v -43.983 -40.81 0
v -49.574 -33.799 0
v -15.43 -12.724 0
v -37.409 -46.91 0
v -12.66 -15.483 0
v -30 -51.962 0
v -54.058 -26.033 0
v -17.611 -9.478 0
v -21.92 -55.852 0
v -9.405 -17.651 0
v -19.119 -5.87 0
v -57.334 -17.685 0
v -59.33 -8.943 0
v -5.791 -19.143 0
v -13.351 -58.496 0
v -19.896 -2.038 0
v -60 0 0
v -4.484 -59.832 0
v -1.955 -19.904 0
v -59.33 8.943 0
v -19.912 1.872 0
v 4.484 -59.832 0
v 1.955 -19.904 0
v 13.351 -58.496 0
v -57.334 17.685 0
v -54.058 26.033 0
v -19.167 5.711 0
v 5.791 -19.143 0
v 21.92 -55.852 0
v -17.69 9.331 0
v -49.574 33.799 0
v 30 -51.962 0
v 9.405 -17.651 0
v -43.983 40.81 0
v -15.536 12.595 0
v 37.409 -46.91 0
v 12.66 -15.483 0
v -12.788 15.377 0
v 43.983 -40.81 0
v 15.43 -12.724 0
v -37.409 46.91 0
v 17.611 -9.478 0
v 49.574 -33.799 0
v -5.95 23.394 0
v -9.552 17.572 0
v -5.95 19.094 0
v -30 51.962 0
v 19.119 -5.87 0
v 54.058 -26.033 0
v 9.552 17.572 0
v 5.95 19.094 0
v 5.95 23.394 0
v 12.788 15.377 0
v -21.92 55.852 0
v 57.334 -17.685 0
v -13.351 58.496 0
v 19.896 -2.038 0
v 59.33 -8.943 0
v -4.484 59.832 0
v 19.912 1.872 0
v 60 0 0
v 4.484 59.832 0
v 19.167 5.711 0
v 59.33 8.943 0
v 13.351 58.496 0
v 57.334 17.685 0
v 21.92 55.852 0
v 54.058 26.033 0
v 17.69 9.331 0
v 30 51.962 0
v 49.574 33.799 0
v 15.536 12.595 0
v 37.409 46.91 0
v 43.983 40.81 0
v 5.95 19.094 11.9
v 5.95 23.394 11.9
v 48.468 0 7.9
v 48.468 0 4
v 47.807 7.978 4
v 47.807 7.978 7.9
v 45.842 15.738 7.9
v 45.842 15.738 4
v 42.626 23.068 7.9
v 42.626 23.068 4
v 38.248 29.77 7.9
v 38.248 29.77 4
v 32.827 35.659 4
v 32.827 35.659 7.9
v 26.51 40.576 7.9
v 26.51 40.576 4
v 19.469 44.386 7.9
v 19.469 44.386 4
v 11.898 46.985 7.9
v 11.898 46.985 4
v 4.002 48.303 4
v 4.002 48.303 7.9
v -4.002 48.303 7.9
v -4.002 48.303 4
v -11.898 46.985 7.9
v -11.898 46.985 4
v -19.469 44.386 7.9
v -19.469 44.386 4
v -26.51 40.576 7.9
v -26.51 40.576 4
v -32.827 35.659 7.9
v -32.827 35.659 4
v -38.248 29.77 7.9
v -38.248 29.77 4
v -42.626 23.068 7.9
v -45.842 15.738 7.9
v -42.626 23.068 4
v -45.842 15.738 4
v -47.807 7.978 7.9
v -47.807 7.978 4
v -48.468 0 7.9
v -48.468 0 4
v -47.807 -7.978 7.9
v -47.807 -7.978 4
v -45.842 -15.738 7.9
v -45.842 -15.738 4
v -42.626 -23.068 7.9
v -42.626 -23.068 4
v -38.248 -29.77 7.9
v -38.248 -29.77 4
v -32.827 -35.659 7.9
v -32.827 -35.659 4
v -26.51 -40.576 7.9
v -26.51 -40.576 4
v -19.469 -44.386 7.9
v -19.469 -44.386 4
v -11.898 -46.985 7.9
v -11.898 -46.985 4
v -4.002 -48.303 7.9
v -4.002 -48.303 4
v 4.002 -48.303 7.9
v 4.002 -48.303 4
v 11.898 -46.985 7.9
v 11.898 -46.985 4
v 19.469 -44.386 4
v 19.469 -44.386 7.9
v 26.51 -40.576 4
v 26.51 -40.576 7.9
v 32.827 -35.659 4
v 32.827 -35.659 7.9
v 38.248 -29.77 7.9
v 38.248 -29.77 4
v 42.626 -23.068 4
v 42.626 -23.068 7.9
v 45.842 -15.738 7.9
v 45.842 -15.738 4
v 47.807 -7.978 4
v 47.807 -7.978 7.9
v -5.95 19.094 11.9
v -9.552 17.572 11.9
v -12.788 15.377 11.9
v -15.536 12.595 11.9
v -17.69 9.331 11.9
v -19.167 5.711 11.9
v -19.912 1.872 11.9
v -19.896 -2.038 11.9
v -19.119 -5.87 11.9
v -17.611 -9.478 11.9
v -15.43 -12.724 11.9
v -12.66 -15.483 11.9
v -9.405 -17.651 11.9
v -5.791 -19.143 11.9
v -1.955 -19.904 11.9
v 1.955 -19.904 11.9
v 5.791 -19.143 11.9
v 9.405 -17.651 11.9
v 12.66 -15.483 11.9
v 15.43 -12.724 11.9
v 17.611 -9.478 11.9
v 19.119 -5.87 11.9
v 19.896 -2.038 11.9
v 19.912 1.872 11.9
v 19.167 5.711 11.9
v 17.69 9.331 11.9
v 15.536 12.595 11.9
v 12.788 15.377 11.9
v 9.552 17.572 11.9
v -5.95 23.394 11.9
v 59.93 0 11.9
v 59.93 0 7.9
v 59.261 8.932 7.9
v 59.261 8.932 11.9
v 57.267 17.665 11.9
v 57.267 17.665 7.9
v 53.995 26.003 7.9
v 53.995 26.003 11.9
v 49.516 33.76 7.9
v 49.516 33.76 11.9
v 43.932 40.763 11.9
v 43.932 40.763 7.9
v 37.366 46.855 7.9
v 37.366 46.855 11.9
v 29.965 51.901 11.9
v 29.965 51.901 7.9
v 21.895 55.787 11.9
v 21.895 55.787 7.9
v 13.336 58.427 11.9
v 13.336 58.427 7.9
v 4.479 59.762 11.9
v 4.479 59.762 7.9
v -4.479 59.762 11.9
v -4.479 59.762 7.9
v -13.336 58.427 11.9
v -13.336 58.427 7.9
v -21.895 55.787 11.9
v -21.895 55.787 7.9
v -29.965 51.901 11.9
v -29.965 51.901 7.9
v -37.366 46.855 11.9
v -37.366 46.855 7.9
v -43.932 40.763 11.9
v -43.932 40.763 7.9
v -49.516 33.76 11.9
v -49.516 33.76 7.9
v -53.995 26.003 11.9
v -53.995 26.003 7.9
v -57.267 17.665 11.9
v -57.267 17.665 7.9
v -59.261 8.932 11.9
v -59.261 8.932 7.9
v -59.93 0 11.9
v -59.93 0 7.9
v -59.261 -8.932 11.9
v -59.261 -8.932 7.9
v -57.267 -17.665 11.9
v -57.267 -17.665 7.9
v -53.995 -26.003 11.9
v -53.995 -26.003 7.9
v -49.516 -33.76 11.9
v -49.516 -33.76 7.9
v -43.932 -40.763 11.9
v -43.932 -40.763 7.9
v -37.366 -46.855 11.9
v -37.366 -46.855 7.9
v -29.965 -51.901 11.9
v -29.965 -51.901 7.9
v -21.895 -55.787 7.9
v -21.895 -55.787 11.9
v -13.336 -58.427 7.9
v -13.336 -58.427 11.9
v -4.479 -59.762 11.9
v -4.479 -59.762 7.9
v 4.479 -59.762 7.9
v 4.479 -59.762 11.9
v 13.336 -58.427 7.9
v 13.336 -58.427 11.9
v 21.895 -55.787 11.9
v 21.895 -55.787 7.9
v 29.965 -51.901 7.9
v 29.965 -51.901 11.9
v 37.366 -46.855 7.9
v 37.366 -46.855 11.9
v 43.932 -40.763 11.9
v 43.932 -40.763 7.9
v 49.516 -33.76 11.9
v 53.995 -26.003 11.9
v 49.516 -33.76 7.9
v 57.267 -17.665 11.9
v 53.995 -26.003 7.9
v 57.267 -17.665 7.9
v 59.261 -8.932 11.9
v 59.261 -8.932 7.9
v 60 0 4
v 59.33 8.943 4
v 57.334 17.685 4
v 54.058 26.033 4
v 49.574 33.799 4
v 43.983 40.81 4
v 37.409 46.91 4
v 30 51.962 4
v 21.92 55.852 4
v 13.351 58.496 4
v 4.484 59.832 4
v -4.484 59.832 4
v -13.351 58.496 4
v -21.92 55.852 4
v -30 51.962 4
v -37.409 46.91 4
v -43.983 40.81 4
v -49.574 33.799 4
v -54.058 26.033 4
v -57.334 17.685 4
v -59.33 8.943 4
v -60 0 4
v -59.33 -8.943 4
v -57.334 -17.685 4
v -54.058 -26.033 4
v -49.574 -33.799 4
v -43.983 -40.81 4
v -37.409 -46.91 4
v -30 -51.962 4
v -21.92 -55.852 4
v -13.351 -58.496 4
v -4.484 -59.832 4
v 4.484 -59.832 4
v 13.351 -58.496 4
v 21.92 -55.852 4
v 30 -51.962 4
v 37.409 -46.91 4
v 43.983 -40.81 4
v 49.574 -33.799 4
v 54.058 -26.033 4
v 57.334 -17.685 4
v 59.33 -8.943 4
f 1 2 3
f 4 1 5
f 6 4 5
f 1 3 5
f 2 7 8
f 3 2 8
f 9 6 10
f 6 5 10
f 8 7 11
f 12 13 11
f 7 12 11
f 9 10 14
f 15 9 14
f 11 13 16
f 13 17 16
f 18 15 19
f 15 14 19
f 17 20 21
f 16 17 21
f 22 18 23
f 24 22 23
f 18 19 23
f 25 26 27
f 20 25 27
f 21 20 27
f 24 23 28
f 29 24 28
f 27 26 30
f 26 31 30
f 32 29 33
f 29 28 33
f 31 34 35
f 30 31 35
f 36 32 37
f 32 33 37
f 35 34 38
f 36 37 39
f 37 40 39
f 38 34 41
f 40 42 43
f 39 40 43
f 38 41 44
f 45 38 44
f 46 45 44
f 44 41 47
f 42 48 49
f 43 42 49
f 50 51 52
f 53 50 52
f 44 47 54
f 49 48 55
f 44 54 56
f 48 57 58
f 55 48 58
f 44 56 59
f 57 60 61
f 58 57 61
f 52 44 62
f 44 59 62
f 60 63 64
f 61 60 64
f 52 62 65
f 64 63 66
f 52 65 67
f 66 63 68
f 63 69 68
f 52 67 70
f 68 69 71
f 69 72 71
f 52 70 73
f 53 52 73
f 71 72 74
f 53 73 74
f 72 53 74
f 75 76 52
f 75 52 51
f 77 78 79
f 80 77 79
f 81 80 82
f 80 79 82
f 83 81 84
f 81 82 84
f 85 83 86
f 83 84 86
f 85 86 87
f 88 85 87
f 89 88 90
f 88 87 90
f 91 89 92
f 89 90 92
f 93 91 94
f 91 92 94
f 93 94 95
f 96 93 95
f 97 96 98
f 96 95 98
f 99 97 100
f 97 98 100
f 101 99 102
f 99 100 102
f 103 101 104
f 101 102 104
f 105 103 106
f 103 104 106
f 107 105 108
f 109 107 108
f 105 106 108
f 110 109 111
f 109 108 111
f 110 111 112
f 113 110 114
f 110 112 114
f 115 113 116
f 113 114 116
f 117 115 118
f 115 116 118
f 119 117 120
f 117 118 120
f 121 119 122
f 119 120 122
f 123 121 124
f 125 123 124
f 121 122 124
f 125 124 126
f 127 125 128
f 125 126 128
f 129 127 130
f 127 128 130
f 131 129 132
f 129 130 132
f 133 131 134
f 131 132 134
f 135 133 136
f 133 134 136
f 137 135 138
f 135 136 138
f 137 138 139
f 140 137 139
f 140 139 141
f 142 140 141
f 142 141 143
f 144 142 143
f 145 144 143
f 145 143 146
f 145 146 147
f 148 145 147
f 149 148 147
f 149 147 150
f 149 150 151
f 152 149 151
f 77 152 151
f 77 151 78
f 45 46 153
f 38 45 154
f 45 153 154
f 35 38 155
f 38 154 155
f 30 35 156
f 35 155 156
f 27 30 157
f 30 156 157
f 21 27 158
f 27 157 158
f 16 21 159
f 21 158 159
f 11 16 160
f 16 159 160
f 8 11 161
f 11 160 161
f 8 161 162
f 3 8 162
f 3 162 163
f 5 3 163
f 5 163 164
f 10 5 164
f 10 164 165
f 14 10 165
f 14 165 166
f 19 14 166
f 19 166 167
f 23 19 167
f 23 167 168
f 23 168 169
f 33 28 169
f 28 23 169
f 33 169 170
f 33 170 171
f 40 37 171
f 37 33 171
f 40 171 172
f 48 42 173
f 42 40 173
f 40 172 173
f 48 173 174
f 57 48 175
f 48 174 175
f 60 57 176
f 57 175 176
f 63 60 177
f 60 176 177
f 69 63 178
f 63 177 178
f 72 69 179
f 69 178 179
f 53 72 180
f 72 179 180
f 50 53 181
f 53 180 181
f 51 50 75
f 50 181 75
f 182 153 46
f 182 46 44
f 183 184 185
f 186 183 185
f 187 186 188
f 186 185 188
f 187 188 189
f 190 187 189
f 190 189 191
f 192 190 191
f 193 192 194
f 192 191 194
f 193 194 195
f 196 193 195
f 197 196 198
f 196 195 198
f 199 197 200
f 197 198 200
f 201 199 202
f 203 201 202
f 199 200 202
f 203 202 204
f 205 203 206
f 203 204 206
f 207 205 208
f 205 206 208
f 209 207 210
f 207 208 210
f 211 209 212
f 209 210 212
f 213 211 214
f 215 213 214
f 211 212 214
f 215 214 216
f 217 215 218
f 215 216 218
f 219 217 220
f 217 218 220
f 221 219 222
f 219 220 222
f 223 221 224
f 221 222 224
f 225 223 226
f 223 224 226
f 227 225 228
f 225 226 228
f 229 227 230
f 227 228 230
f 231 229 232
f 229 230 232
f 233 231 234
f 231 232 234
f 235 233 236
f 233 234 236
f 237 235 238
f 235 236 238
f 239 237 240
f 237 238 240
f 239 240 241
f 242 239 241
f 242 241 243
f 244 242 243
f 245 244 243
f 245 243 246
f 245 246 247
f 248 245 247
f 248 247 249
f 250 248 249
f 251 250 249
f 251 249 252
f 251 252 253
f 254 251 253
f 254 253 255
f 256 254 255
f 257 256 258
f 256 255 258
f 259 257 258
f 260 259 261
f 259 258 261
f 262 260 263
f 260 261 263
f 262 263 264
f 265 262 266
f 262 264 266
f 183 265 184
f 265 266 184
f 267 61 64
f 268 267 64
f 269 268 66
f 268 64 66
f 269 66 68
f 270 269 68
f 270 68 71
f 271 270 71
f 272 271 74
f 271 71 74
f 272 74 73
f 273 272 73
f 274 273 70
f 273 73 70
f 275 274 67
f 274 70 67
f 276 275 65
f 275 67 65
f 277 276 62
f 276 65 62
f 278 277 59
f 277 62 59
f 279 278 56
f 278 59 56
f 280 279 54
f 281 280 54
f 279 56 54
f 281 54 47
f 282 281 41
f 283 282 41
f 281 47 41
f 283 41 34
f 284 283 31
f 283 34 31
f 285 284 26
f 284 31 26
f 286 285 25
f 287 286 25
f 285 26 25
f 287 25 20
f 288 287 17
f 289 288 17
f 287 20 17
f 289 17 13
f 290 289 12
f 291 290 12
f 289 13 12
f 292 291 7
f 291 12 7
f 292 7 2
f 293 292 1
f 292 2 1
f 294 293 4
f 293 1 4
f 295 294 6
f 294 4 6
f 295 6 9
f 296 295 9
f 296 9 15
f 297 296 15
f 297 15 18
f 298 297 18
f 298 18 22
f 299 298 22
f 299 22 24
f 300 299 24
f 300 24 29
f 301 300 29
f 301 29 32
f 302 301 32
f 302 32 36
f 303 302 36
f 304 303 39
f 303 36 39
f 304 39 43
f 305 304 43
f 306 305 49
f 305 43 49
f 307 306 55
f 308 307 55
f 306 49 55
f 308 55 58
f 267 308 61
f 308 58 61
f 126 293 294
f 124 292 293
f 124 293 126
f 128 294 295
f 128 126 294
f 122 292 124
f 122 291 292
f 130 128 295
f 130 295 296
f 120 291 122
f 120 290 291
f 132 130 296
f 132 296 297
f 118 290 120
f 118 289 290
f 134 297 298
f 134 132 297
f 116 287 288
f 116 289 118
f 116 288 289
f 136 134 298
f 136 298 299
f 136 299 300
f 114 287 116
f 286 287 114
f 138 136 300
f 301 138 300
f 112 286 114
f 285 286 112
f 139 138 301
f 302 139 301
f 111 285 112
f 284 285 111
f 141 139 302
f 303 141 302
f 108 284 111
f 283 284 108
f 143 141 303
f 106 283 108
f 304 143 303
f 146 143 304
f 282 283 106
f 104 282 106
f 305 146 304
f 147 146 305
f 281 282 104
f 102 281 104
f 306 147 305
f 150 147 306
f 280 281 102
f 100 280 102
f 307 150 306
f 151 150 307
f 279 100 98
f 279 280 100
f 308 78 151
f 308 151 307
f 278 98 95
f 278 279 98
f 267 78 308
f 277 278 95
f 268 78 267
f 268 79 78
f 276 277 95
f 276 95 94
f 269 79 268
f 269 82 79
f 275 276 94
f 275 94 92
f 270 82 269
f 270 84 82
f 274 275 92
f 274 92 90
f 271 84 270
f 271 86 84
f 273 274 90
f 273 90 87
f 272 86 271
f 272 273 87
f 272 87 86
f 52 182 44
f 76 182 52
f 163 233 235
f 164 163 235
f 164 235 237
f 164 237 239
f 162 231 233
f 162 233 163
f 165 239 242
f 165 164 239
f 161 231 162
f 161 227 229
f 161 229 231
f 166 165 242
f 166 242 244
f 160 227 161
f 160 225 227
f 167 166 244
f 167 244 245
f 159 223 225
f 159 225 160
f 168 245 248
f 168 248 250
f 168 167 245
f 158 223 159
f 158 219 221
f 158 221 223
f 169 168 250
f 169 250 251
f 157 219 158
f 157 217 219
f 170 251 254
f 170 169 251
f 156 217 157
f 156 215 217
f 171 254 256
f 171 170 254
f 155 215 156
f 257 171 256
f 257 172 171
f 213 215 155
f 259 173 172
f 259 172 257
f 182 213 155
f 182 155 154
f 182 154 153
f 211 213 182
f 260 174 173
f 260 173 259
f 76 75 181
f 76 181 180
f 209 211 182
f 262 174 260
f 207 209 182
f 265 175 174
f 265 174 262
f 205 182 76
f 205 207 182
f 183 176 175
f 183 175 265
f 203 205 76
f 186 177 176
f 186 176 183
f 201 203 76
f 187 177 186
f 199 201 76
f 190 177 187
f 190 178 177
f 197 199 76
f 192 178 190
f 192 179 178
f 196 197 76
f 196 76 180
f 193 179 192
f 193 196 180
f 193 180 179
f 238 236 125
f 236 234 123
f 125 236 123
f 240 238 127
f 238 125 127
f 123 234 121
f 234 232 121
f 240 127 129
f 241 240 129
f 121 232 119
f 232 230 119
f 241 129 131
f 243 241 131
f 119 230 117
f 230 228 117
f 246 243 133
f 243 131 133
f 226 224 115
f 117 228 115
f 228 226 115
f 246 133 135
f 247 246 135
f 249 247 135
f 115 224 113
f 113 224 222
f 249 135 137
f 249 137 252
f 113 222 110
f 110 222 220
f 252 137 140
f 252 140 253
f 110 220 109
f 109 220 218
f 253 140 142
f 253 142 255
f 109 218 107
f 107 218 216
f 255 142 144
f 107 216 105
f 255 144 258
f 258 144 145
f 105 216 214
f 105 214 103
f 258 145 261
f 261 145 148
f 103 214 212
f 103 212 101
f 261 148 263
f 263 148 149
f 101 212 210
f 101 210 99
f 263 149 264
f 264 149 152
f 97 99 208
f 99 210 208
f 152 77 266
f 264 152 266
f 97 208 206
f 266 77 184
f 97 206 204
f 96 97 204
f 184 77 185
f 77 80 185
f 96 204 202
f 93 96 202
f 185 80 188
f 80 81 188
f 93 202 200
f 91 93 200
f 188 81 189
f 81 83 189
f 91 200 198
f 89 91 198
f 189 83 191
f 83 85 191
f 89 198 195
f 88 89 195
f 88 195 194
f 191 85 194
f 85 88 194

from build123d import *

# Parameters (mm, degrees)
SKETCH1_R           = 60
BOSS_EXTRUDE2_DEPTH = 4
SKETCH2_R           = 20
CUT_EXTRUDE1_DEPTH  = 20.9
SKETCH3_R           = 48.468089367
BOSS_EXTRUDE3_DEPTH = 3.9
SKETCH4_R           = 59.929943569
BOSS_EXTRUDE6_DEPTH = 4
SKETCH8_R           = 20
CUT_EXTRUDE5_DEPTH  = 48
CUT_EXTRUDE6_DEPTH  = 48


with BuildPart() as part:
    # Sketch1 → Boss-Extrude2 (new body)
    with BuildSketch(Plane.XY):
        Circle(SKETCH1_R)
    extrude(amount=BOSS_EXTRUDE2_DEPTH)

    # Sketch2 → Cut-Extrude1 (cut)
    with BuildSketch(Plane.XY.offset(4)):
        Circle(SKETCH2_R)
    extrude(amount=-CUT_EXTRUDE1_DEPTH, mode=Mode.SUBTRACT)

    # Sketch3 → Boss-Extrude3 (add)
    with BuildSketch(Plane.XY.offset(4)):
        Circle(SKETCH3_R)
    extrude(amount=BOSS_EXTRUDE3_DEPTH)

    # Sketch4 → Boss-Extrude6 (add)
    with BuildSketch(Plane.XY.offset(7.9)):
        Circle(SKETCH4_R)
    extrude(amount=BOSS_EXTRUDE6_DEPTH)

    # Sketch8 → Cut-Extrude5 (cut)
    with BuildSketch(Plane.XY.offset(11.9)):
        Circle(SKETCH8_R)
    extrude(amount=-CUT_EXTRUDE5_DEPTH, mode=Mode.SUBTRACT)

    # Sketch9 → Cut-Extrude6 (cut)
    with BuildSketch(Plane.XY.offset(11.9)):
        with BuildLine():
            Line((-5.95, 19.094436362), (-5.95, 23.394436362))
            Line((-5.95, 23.394436362), (5.95, 23.394436362))
            Line((5.95, 23.394436362), (5.95, 19.094436362))
            ThreePointArc((5.95, 19.094436362), (0, 20), (-5.95, 19.094436362))
        make_face()
    extrude(amount=-CUT_EXTRUDE6_DEPTH, mode=Mode.SUBTRACT)


solid = part.part
